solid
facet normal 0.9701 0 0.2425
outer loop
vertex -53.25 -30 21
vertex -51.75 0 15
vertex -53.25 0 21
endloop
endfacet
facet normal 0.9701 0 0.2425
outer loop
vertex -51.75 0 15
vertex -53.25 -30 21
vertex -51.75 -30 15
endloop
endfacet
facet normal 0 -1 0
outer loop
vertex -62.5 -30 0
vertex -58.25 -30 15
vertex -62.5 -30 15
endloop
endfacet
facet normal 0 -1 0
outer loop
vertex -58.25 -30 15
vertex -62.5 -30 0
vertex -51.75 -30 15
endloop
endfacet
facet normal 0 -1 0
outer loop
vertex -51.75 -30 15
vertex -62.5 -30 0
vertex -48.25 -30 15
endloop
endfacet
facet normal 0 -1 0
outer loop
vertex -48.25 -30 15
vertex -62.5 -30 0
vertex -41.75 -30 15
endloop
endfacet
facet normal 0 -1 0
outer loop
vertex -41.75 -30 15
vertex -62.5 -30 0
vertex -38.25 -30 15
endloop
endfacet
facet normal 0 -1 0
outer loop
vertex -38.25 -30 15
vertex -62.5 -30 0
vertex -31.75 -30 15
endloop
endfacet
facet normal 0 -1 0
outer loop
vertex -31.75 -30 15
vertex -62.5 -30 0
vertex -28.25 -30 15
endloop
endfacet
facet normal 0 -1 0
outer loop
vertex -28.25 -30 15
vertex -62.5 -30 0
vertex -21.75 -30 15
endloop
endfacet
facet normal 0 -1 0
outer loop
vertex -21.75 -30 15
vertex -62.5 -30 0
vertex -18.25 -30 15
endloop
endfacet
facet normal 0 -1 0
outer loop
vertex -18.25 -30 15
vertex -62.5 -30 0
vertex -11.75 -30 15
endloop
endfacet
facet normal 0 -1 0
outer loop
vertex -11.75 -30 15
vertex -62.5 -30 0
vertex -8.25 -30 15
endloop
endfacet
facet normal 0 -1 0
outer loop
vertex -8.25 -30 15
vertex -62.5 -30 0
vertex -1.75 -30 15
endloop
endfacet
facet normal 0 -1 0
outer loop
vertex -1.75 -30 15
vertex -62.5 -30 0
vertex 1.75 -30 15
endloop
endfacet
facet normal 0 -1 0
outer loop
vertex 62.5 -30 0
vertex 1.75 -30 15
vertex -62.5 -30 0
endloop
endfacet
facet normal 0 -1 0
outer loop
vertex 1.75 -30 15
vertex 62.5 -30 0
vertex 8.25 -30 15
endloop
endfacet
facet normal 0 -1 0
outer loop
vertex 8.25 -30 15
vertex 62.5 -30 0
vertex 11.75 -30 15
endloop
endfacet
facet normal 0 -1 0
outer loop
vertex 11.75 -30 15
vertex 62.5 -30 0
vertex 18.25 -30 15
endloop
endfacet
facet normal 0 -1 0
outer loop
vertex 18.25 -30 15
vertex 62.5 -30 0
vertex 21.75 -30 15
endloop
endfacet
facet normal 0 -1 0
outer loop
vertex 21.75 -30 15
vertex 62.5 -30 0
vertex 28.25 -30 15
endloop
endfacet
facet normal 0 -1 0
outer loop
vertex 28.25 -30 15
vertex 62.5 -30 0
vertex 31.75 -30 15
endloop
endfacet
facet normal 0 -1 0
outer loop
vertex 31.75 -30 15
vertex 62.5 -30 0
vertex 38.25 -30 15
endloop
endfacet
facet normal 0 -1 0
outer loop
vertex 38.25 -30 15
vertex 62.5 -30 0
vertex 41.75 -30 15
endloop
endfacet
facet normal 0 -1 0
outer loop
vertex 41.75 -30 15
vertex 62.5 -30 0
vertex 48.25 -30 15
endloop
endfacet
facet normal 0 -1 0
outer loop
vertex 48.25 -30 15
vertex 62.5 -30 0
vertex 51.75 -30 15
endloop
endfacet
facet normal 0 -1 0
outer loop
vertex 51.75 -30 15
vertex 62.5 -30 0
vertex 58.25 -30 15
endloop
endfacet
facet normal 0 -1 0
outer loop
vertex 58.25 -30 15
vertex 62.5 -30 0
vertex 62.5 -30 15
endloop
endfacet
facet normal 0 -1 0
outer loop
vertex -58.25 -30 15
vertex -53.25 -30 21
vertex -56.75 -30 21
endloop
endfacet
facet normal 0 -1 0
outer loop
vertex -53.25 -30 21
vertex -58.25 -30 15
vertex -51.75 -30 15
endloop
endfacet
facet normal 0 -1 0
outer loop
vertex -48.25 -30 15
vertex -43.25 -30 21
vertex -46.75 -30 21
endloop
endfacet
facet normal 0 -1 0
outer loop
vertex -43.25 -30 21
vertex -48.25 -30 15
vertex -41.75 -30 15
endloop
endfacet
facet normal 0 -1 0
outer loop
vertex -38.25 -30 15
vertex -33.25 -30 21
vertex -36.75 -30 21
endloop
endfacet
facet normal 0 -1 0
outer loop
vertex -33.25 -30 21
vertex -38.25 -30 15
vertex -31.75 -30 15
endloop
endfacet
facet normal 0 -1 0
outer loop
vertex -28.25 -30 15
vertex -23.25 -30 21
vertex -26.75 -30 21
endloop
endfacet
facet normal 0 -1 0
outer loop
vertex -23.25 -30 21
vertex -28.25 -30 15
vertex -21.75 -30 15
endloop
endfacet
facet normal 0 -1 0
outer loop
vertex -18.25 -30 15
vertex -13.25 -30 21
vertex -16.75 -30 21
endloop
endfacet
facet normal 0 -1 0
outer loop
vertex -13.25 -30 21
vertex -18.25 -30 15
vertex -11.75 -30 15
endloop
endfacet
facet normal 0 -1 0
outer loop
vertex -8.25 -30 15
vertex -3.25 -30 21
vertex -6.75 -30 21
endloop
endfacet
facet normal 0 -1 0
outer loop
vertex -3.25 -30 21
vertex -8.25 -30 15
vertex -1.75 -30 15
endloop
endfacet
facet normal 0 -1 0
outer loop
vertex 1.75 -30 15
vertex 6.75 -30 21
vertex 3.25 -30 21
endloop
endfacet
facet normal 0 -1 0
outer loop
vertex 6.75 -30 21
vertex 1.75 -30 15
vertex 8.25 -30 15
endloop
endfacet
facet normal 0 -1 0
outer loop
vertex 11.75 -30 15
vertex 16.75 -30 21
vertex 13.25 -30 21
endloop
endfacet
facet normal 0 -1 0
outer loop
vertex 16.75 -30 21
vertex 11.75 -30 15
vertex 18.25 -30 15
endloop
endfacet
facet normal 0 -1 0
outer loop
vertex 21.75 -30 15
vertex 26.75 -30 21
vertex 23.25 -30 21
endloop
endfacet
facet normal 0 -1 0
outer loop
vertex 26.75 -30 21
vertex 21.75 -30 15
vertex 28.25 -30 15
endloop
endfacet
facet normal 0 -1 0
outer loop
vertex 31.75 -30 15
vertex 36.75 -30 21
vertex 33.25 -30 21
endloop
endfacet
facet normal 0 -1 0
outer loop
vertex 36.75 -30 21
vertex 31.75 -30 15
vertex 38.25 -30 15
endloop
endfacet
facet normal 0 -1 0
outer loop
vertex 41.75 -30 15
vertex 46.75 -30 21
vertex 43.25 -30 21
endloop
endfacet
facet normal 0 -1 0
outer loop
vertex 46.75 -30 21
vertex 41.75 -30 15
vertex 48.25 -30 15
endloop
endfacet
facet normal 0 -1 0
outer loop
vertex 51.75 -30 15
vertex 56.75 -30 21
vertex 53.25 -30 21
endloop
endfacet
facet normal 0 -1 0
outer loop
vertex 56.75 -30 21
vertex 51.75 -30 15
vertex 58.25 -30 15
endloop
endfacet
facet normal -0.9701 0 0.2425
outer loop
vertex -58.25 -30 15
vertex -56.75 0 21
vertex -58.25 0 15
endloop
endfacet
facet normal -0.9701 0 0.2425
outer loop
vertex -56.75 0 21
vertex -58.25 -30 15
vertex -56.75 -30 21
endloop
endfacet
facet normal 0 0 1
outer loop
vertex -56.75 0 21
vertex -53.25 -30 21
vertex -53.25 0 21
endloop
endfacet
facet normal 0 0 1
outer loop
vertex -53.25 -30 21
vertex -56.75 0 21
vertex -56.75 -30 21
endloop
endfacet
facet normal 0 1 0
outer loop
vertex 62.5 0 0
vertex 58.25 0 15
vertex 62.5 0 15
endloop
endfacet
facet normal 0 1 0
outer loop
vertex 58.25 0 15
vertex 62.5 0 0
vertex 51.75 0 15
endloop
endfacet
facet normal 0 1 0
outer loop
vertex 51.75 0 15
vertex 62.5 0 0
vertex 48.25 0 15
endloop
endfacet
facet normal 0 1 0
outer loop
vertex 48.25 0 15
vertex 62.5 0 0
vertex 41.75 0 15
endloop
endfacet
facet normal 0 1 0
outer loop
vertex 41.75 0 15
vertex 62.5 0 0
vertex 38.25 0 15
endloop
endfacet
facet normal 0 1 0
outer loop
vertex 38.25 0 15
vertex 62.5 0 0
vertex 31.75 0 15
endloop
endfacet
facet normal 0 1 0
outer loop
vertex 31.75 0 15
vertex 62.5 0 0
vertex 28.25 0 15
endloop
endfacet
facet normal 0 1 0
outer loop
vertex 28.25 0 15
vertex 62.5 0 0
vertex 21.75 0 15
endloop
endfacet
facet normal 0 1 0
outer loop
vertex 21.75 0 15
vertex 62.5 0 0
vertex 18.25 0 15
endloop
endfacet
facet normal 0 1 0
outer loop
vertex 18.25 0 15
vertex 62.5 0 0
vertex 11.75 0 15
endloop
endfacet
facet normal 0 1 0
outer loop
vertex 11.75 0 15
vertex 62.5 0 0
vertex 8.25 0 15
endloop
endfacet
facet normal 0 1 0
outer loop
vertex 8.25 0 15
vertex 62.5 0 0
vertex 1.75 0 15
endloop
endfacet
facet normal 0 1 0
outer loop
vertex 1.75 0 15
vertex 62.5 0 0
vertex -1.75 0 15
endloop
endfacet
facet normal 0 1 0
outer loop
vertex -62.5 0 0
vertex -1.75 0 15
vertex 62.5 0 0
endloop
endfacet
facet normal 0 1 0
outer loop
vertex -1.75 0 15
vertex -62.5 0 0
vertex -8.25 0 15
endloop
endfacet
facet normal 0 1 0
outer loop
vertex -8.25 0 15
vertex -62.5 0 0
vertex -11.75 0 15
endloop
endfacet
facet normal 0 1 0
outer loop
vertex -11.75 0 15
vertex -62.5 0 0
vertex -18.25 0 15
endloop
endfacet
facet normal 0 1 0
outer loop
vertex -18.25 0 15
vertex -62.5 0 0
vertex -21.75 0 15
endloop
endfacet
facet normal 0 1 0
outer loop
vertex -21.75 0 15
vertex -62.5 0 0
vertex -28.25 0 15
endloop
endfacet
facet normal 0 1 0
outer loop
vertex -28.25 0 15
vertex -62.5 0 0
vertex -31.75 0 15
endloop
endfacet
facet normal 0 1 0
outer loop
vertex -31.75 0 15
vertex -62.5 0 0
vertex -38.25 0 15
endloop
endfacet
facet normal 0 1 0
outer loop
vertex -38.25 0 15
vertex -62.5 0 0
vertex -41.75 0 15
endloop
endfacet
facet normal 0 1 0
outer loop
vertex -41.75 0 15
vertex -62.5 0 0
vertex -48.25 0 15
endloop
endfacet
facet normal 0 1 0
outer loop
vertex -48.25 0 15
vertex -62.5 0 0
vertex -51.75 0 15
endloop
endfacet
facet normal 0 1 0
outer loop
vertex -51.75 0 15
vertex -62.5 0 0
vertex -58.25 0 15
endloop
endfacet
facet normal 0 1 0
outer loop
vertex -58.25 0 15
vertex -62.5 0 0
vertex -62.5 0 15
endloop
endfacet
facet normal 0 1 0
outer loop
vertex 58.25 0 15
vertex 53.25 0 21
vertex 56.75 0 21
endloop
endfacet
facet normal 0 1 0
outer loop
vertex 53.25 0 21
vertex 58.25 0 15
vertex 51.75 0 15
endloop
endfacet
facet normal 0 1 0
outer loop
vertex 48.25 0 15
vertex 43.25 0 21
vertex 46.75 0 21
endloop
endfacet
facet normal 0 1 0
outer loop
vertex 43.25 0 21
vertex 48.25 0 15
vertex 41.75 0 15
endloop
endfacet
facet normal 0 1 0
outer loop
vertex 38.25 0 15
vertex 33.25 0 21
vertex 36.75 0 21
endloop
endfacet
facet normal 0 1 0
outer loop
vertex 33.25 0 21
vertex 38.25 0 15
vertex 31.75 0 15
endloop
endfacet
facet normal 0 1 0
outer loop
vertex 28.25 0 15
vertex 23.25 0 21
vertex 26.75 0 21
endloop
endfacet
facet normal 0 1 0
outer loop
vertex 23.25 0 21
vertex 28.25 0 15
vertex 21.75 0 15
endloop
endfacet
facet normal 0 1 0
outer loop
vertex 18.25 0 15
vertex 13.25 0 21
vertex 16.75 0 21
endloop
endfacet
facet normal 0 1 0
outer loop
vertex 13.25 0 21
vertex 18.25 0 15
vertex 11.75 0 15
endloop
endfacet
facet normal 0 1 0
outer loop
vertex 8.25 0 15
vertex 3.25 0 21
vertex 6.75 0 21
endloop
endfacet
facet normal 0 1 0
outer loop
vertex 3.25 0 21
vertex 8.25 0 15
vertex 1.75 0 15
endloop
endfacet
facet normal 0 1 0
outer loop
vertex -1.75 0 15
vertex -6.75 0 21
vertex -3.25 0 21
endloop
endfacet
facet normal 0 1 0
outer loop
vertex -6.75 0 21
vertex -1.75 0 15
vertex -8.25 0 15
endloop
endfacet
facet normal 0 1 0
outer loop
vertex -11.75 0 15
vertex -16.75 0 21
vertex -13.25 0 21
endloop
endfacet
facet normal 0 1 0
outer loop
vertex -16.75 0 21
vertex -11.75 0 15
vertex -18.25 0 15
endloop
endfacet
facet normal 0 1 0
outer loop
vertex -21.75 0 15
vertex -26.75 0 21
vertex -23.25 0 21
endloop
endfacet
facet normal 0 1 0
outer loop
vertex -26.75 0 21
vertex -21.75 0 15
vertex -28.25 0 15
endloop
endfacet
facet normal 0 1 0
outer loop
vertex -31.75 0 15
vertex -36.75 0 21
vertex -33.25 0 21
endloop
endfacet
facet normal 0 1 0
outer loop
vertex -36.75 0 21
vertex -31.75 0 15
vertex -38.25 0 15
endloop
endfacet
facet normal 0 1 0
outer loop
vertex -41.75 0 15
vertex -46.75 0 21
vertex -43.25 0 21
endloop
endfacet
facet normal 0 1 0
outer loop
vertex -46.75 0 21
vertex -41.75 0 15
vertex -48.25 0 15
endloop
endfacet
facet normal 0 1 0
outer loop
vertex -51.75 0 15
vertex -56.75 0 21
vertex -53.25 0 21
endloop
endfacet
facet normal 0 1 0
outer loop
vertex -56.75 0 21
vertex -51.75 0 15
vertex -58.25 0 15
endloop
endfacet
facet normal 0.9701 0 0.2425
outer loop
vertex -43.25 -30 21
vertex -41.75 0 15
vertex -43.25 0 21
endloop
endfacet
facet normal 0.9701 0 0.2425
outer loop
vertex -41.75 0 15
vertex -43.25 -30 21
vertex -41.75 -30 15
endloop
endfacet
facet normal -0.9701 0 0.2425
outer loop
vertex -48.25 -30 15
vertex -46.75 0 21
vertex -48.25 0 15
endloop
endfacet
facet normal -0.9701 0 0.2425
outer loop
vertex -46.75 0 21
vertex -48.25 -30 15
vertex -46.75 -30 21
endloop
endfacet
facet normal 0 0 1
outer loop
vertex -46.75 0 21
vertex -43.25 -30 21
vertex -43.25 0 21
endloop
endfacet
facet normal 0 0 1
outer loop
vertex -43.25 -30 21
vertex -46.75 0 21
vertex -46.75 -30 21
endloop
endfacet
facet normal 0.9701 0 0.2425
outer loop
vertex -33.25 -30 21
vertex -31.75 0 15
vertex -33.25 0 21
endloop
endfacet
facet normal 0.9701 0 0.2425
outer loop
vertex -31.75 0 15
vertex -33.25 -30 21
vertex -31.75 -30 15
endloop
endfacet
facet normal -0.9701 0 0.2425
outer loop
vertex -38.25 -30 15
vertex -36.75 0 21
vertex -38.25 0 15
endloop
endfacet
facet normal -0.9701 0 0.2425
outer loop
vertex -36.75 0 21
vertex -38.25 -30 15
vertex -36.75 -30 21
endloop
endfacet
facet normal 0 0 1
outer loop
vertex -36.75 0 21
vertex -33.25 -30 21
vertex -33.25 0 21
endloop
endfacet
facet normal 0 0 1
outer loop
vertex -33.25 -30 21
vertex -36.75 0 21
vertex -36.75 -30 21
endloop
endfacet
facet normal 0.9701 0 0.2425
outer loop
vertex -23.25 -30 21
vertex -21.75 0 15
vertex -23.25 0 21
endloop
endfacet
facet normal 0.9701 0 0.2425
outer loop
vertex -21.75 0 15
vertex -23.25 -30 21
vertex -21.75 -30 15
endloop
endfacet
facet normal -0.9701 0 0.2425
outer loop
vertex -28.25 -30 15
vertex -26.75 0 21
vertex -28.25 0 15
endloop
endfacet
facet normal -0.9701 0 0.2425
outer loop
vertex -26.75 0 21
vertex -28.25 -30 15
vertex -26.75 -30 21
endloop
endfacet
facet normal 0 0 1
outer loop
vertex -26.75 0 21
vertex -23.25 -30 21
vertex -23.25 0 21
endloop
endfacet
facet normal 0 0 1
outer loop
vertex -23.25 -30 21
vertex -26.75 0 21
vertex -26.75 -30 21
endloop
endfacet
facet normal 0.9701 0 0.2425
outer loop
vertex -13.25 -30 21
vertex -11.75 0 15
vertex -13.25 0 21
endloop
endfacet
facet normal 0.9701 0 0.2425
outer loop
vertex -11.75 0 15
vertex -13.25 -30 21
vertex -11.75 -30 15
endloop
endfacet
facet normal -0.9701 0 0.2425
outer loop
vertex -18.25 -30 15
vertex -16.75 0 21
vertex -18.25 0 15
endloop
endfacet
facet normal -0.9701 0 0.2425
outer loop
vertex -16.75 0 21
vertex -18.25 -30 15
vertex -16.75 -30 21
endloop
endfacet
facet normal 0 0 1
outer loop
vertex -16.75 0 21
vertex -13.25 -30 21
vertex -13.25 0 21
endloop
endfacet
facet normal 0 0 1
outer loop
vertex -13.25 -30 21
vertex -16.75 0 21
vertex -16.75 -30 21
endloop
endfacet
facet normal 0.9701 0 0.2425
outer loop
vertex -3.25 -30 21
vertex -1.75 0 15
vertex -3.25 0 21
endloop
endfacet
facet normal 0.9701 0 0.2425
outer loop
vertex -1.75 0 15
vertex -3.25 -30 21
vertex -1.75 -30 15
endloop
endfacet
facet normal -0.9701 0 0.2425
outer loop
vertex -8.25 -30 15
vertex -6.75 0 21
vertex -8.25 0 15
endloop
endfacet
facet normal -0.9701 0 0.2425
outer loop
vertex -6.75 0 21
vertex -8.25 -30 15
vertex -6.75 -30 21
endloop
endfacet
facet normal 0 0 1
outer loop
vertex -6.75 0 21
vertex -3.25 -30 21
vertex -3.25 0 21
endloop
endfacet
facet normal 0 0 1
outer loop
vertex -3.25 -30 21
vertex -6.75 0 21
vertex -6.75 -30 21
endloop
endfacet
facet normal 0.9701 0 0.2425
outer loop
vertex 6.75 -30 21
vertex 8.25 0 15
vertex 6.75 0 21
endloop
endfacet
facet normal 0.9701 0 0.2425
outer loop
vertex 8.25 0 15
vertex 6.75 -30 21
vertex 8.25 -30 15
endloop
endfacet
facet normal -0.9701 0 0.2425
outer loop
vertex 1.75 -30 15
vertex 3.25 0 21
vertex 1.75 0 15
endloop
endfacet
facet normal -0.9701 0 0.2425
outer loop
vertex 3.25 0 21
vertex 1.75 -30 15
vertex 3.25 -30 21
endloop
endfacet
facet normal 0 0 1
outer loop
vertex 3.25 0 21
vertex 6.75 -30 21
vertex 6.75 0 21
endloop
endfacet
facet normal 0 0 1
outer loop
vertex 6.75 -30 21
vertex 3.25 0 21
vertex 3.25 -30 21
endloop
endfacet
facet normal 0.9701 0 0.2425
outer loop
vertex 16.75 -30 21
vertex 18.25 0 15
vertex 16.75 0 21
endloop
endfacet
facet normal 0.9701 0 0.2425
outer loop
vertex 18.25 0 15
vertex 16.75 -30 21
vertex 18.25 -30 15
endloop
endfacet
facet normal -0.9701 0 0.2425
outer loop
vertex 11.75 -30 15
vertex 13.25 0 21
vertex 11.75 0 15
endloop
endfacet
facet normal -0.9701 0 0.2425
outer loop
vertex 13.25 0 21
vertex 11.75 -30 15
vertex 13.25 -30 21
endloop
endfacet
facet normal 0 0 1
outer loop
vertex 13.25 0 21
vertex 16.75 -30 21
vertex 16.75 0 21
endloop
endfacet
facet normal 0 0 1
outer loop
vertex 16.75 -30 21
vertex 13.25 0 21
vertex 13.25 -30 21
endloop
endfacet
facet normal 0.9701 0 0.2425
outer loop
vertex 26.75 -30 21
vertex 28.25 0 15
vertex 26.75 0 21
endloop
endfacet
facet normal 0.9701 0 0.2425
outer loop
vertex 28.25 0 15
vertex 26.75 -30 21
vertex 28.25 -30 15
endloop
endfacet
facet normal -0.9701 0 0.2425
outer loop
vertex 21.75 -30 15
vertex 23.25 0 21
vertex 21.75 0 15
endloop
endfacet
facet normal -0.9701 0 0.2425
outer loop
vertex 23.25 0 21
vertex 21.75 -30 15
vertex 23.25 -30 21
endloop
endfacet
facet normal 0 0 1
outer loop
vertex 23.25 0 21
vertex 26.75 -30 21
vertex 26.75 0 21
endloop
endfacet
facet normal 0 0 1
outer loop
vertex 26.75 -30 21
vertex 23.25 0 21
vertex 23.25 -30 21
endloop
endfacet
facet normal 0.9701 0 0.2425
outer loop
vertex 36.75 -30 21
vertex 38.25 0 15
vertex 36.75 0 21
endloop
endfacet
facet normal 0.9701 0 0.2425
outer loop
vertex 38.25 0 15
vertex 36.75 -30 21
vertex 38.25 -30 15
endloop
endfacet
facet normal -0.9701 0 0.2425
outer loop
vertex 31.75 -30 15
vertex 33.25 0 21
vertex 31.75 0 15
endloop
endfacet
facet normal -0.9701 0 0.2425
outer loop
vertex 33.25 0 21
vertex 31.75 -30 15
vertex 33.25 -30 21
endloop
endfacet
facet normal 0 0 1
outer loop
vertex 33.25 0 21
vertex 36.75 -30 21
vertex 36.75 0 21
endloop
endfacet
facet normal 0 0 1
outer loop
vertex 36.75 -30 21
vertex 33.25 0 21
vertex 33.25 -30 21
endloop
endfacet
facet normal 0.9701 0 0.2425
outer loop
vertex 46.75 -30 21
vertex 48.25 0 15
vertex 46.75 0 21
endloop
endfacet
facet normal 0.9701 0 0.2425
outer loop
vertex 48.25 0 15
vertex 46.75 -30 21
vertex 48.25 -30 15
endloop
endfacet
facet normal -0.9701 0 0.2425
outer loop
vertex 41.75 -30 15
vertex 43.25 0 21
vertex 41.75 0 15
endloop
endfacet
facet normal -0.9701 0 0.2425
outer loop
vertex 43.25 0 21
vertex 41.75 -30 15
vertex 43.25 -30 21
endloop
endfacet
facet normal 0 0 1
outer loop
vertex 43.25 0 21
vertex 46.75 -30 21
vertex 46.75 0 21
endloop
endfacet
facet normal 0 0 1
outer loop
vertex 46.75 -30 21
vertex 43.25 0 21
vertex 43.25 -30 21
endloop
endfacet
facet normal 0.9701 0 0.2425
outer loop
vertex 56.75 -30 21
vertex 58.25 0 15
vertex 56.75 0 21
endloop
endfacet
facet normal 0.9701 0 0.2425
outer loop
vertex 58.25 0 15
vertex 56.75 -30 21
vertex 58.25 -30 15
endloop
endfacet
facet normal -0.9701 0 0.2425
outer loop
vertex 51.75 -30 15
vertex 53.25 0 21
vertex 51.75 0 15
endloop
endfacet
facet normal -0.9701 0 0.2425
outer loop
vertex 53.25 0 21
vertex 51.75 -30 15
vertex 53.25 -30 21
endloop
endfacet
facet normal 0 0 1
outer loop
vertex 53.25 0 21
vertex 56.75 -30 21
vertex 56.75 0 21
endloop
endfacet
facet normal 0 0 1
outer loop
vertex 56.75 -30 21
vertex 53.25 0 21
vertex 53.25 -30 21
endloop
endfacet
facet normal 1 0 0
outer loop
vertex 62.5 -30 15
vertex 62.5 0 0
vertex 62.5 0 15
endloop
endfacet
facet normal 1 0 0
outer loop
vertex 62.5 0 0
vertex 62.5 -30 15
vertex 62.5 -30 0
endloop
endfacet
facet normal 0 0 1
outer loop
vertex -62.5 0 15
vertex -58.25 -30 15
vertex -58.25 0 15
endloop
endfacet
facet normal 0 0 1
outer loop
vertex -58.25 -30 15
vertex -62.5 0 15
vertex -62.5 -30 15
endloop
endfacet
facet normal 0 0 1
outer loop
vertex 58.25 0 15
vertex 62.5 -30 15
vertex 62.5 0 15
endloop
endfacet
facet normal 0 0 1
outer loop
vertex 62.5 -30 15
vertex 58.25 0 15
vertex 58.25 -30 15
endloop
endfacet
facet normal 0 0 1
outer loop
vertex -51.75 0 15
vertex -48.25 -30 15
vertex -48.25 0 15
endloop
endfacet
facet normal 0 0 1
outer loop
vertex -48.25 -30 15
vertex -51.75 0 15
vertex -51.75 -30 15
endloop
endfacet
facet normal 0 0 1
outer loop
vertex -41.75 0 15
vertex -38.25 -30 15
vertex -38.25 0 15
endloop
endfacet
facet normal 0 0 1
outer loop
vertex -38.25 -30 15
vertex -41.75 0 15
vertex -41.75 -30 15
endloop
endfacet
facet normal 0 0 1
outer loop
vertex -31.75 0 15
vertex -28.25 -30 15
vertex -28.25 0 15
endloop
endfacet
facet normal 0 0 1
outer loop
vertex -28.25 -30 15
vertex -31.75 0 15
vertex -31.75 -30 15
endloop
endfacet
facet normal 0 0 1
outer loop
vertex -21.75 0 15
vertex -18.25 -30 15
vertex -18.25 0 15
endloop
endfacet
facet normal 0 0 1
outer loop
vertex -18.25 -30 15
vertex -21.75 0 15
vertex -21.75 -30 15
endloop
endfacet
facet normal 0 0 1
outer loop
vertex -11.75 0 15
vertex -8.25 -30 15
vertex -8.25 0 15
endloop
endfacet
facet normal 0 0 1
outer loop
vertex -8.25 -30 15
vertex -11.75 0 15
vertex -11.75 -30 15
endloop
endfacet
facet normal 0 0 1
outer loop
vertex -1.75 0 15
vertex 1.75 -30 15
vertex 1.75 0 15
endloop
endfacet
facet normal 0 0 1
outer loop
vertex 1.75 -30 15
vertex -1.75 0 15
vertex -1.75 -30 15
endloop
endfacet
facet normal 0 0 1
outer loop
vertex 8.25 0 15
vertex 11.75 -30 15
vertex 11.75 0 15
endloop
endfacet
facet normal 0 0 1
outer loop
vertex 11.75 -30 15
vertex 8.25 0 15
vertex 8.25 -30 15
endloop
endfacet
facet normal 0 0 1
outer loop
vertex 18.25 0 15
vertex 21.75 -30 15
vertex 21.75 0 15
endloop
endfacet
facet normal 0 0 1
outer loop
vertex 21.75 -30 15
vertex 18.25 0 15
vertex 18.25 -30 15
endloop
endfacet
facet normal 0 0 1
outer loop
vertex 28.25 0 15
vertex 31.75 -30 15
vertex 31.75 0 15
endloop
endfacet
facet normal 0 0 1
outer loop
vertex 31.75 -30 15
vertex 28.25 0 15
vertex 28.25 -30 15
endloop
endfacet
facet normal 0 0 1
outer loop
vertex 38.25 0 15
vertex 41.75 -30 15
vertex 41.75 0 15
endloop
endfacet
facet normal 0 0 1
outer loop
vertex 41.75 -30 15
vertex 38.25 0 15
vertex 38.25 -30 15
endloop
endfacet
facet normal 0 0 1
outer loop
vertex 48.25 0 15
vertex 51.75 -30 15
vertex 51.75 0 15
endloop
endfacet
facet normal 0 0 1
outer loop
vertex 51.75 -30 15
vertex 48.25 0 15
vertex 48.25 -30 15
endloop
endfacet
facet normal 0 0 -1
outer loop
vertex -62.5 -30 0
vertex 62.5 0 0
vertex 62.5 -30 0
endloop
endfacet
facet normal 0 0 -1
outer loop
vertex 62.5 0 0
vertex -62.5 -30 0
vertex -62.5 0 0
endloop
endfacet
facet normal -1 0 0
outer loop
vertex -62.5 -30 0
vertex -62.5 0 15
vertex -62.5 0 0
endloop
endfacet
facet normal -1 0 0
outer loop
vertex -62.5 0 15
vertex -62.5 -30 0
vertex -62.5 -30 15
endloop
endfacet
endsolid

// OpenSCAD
$fn = 32;

// ----------------------------------------------------------------------
// Toothed rack, 12 teeth
// 10 mm pitch, 6 mm teeth
// ----------------------------------------------------------------------

// --- parameters (mm) ---
bar_w = 30;     // bar width (Y)
bar_h = 15;     // bar height (Z)
teeth = 12;     // number of teeth
pitch = 10;     // tooth pitch
tooth_h = 6;    // tooth height above the bar
root_w = 7;     // tooth width at the root
crest_w = 3.5;  // tooth width at the crest

// --- derived feature positions (mm) ---
span = (teeth - 1) * pitch;  // = 110   distance between the outer teeth
bar_l = span + root_w + 8;   // = 125   bar length: teeth plus 4 mm at each end
tooth_x = -span / 2;         // = -55   X of the first tooth
height = bar_h + tooth_h;    // = 21   overall height
feature_centers = [
  [tooth_x + 0 * pitch, -bar_w / 2],
  [tooth_x + 1 * pitch, -bar_w / 2],
  [tooth_x + 2 * pitch, -bar_w / 2],
  [tooth_x + 3 * pitch, -bar_w / 2],
  [tooth_x + 4 * pitch, -bar_w / 2],
  [tooth_x + 5 * pitch, -bar_w / 2],
  [tooth_x + 6 * pitch, -bar_w / 2],
  [tooth_x + 7 * pitch, -bar_w / 2],
  [tooth_x + 8 * pitch, -bar_w / 2],
  [tooth_x + 9 * pitch, -bar_w / 2],
  [tooth_x + 10 * pitch, -bar_w / 2],
  [tooth_x + 11 * pitch, -bar_w / 2]
];   // tooth centre line, drives the tooth loop

// bar with a rack of teeth, one extruded trapezoium per centre
module rack_tooth() {
  linear_extrude(height = bar_w)
    polygon(points = [
      [0, 0],
      [root_w, 0],
      [root_w / 2 + crest_w / 2, tooth_h + 1],
      [root_w / 2 - crest_w / 2, tooth_h + 1]
    ]);
}

union() {
  translate([-bar_l / 2, -bar_w, 0]) cube([bar_l, bar_w, bar_h]);
  for (centre = feature_centers)
    translate([centre[0] - root_w / 2, 0, bar_h - 1]) rotate([90, 0, 0]) rack_tooth();
}
